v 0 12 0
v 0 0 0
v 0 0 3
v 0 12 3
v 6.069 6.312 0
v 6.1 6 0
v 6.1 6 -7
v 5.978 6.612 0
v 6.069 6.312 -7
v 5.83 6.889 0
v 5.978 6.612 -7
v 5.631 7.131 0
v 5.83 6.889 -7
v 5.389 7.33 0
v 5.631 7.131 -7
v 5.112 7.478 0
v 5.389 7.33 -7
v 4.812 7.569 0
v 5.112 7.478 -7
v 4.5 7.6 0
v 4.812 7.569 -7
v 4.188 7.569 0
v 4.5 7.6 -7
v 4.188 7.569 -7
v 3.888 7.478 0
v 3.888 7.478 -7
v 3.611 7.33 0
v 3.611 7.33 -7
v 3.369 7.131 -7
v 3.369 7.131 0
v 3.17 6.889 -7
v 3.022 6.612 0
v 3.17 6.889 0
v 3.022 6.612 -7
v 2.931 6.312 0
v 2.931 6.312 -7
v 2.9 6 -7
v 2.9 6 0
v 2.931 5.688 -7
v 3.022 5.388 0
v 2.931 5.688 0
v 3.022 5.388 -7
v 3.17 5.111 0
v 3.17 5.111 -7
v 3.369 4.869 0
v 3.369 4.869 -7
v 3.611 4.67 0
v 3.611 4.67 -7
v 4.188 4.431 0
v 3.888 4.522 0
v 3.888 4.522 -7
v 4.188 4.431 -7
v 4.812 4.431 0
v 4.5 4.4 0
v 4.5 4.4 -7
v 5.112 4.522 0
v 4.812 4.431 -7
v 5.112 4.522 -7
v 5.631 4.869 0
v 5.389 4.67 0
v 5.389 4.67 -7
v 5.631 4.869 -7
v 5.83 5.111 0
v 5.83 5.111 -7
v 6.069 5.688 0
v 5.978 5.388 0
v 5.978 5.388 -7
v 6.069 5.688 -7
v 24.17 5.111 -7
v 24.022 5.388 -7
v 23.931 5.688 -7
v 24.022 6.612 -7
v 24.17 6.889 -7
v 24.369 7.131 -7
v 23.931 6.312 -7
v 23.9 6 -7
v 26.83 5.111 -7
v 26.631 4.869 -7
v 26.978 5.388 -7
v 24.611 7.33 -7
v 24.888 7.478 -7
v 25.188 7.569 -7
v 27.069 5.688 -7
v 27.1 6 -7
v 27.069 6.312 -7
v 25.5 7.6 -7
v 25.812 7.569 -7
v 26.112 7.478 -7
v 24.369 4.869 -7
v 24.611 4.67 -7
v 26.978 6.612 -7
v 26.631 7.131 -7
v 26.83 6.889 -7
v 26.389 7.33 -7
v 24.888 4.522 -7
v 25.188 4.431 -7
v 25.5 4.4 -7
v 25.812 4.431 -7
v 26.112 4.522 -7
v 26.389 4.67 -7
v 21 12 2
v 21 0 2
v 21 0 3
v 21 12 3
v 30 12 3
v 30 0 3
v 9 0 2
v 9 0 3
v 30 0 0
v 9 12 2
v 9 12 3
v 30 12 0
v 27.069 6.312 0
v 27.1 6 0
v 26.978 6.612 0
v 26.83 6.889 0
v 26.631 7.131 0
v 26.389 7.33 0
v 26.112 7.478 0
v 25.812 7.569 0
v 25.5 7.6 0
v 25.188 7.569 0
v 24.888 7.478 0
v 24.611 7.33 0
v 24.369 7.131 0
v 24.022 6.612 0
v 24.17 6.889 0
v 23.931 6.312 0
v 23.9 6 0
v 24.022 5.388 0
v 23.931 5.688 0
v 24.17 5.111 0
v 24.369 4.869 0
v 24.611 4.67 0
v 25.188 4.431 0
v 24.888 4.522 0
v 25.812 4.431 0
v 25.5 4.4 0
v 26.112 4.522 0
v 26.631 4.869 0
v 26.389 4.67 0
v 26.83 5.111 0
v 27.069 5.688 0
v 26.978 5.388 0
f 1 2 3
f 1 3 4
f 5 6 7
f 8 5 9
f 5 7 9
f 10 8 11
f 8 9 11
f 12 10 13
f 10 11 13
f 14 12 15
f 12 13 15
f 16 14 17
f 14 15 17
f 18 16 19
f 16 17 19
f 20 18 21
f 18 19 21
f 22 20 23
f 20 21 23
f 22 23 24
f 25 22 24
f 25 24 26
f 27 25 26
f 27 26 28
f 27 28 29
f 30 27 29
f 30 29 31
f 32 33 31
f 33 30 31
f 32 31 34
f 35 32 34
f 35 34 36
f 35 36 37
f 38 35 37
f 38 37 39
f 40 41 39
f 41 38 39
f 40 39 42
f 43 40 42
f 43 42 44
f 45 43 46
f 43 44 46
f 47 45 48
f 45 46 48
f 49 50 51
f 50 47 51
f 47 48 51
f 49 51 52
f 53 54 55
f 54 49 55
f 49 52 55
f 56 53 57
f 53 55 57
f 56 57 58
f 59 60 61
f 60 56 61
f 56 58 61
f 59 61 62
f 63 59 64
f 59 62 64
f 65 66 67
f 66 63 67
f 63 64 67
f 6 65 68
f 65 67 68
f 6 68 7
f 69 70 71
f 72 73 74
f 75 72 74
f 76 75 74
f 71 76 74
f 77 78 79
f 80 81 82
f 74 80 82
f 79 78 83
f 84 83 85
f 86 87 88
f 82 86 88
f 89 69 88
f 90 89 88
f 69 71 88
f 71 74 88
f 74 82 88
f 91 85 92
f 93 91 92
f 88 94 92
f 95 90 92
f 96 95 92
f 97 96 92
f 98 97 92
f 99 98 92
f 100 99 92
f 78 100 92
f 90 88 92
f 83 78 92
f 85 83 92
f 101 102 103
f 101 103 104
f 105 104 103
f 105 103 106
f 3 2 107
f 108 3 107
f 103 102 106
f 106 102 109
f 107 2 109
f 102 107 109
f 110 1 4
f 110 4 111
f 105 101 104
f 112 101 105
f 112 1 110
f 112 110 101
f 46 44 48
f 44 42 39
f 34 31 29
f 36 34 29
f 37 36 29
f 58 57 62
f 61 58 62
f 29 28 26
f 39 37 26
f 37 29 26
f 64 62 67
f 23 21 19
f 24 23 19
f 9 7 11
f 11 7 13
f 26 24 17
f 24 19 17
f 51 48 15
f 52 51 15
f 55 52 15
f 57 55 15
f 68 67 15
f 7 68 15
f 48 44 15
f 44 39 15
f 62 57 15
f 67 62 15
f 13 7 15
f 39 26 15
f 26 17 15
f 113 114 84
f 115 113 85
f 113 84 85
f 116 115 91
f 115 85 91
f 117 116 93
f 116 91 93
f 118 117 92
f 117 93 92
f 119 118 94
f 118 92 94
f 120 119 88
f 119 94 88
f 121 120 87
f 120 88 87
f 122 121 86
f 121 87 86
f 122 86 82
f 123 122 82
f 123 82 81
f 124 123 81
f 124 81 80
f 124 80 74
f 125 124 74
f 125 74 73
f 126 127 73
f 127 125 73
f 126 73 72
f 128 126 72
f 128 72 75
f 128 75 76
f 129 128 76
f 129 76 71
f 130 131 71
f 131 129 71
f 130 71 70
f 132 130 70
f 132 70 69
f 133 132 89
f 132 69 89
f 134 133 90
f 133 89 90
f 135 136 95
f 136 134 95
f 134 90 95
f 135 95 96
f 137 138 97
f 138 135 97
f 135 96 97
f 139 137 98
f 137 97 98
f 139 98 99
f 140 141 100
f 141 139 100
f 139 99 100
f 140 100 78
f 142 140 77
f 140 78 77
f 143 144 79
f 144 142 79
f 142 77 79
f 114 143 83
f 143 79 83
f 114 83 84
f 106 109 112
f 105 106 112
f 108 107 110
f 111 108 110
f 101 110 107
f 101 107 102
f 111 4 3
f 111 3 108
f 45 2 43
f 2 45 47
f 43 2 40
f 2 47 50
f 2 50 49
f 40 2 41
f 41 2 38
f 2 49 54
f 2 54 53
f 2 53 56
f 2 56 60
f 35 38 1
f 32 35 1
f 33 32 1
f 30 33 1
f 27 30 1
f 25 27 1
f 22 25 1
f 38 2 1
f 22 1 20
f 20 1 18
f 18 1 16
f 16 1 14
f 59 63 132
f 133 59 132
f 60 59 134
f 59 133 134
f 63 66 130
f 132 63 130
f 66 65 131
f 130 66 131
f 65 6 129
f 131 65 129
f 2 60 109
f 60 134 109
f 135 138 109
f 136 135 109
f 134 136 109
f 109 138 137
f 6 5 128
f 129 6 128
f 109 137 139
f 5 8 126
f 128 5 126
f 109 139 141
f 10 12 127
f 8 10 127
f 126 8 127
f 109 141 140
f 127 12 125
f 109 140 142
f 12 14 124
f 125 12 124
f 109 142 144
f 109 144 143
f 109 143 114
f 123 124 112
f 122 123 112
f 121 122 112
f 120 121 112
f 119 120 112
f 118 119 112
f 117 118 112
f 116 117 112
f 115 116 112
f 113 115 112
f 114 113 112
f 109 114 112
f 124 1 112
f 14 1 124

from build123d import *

# Parameters (mm, degrees)
CYLINDER_R        = 1.6
CYLINDER_DEPTH    = 10
BOX001_W          = 12
BOX001_H          = 12
BOX001_DEPTH      = 1
BOX_W             = 30
BOX_H             = 12
BOX_DEPTH         = 3
CYLINDER001_R     = 1.6
CYLINDER001_DEPTH = 10


with BuildPart() as cylinder:
    # Cylinder → Cylinder (new body)
    with BuildSketch(Plane(origin=(25.5, 6, -7), x_dir=(1, 0, 0), z_dir=(0, 0, 1))):
        Circle(CYLINDER_R)
    extrude(amount=CYLINDER_DEPTH)


with BuildPart() as posicion_para_boton:
    # Box001 → Box001 (new body)
    with BuildSketch(Plane(origin=(9, 0, 2), x_dir=(1, 0, 0), z_dir=(0, 0, 1))):
        with Locations((6, 6)):
            Rectangle(BOX001_W, BOX001_H)
    extrude(amount=BOX001_DEPTH)


with BuildPart() as fusion:
    # Box → Box (new body)
    with BuildSketch(Plane.XY):
        with Locations((15, 6)):
            Rectangle(BOX_W, BOX_H)
    extrude(amount=BOX_DEPTH)

    # Cut: cut posicion_para_boton
    add(posicion_para_boton.part, mode=Mode.SUBTRACT)

    # Fusion: union Cylinder
    add(cylinder.part)


with BuildPart() as el_perforador_boton:
    # Cylinder001 → Cylinder001 (new body)
    with BuildSketch(Plane(origin=(4.5, 6, -7), x_dir=(1, 0, 0), z_dir=(0, 0, 1))):
        Circle(CYLINDER001_R)
    extrude(amount=CYLINDER001_DEPTH)

    # Fusion001: union Fusion
    add(fusion.part)


solid = el_perforador_boton.part
